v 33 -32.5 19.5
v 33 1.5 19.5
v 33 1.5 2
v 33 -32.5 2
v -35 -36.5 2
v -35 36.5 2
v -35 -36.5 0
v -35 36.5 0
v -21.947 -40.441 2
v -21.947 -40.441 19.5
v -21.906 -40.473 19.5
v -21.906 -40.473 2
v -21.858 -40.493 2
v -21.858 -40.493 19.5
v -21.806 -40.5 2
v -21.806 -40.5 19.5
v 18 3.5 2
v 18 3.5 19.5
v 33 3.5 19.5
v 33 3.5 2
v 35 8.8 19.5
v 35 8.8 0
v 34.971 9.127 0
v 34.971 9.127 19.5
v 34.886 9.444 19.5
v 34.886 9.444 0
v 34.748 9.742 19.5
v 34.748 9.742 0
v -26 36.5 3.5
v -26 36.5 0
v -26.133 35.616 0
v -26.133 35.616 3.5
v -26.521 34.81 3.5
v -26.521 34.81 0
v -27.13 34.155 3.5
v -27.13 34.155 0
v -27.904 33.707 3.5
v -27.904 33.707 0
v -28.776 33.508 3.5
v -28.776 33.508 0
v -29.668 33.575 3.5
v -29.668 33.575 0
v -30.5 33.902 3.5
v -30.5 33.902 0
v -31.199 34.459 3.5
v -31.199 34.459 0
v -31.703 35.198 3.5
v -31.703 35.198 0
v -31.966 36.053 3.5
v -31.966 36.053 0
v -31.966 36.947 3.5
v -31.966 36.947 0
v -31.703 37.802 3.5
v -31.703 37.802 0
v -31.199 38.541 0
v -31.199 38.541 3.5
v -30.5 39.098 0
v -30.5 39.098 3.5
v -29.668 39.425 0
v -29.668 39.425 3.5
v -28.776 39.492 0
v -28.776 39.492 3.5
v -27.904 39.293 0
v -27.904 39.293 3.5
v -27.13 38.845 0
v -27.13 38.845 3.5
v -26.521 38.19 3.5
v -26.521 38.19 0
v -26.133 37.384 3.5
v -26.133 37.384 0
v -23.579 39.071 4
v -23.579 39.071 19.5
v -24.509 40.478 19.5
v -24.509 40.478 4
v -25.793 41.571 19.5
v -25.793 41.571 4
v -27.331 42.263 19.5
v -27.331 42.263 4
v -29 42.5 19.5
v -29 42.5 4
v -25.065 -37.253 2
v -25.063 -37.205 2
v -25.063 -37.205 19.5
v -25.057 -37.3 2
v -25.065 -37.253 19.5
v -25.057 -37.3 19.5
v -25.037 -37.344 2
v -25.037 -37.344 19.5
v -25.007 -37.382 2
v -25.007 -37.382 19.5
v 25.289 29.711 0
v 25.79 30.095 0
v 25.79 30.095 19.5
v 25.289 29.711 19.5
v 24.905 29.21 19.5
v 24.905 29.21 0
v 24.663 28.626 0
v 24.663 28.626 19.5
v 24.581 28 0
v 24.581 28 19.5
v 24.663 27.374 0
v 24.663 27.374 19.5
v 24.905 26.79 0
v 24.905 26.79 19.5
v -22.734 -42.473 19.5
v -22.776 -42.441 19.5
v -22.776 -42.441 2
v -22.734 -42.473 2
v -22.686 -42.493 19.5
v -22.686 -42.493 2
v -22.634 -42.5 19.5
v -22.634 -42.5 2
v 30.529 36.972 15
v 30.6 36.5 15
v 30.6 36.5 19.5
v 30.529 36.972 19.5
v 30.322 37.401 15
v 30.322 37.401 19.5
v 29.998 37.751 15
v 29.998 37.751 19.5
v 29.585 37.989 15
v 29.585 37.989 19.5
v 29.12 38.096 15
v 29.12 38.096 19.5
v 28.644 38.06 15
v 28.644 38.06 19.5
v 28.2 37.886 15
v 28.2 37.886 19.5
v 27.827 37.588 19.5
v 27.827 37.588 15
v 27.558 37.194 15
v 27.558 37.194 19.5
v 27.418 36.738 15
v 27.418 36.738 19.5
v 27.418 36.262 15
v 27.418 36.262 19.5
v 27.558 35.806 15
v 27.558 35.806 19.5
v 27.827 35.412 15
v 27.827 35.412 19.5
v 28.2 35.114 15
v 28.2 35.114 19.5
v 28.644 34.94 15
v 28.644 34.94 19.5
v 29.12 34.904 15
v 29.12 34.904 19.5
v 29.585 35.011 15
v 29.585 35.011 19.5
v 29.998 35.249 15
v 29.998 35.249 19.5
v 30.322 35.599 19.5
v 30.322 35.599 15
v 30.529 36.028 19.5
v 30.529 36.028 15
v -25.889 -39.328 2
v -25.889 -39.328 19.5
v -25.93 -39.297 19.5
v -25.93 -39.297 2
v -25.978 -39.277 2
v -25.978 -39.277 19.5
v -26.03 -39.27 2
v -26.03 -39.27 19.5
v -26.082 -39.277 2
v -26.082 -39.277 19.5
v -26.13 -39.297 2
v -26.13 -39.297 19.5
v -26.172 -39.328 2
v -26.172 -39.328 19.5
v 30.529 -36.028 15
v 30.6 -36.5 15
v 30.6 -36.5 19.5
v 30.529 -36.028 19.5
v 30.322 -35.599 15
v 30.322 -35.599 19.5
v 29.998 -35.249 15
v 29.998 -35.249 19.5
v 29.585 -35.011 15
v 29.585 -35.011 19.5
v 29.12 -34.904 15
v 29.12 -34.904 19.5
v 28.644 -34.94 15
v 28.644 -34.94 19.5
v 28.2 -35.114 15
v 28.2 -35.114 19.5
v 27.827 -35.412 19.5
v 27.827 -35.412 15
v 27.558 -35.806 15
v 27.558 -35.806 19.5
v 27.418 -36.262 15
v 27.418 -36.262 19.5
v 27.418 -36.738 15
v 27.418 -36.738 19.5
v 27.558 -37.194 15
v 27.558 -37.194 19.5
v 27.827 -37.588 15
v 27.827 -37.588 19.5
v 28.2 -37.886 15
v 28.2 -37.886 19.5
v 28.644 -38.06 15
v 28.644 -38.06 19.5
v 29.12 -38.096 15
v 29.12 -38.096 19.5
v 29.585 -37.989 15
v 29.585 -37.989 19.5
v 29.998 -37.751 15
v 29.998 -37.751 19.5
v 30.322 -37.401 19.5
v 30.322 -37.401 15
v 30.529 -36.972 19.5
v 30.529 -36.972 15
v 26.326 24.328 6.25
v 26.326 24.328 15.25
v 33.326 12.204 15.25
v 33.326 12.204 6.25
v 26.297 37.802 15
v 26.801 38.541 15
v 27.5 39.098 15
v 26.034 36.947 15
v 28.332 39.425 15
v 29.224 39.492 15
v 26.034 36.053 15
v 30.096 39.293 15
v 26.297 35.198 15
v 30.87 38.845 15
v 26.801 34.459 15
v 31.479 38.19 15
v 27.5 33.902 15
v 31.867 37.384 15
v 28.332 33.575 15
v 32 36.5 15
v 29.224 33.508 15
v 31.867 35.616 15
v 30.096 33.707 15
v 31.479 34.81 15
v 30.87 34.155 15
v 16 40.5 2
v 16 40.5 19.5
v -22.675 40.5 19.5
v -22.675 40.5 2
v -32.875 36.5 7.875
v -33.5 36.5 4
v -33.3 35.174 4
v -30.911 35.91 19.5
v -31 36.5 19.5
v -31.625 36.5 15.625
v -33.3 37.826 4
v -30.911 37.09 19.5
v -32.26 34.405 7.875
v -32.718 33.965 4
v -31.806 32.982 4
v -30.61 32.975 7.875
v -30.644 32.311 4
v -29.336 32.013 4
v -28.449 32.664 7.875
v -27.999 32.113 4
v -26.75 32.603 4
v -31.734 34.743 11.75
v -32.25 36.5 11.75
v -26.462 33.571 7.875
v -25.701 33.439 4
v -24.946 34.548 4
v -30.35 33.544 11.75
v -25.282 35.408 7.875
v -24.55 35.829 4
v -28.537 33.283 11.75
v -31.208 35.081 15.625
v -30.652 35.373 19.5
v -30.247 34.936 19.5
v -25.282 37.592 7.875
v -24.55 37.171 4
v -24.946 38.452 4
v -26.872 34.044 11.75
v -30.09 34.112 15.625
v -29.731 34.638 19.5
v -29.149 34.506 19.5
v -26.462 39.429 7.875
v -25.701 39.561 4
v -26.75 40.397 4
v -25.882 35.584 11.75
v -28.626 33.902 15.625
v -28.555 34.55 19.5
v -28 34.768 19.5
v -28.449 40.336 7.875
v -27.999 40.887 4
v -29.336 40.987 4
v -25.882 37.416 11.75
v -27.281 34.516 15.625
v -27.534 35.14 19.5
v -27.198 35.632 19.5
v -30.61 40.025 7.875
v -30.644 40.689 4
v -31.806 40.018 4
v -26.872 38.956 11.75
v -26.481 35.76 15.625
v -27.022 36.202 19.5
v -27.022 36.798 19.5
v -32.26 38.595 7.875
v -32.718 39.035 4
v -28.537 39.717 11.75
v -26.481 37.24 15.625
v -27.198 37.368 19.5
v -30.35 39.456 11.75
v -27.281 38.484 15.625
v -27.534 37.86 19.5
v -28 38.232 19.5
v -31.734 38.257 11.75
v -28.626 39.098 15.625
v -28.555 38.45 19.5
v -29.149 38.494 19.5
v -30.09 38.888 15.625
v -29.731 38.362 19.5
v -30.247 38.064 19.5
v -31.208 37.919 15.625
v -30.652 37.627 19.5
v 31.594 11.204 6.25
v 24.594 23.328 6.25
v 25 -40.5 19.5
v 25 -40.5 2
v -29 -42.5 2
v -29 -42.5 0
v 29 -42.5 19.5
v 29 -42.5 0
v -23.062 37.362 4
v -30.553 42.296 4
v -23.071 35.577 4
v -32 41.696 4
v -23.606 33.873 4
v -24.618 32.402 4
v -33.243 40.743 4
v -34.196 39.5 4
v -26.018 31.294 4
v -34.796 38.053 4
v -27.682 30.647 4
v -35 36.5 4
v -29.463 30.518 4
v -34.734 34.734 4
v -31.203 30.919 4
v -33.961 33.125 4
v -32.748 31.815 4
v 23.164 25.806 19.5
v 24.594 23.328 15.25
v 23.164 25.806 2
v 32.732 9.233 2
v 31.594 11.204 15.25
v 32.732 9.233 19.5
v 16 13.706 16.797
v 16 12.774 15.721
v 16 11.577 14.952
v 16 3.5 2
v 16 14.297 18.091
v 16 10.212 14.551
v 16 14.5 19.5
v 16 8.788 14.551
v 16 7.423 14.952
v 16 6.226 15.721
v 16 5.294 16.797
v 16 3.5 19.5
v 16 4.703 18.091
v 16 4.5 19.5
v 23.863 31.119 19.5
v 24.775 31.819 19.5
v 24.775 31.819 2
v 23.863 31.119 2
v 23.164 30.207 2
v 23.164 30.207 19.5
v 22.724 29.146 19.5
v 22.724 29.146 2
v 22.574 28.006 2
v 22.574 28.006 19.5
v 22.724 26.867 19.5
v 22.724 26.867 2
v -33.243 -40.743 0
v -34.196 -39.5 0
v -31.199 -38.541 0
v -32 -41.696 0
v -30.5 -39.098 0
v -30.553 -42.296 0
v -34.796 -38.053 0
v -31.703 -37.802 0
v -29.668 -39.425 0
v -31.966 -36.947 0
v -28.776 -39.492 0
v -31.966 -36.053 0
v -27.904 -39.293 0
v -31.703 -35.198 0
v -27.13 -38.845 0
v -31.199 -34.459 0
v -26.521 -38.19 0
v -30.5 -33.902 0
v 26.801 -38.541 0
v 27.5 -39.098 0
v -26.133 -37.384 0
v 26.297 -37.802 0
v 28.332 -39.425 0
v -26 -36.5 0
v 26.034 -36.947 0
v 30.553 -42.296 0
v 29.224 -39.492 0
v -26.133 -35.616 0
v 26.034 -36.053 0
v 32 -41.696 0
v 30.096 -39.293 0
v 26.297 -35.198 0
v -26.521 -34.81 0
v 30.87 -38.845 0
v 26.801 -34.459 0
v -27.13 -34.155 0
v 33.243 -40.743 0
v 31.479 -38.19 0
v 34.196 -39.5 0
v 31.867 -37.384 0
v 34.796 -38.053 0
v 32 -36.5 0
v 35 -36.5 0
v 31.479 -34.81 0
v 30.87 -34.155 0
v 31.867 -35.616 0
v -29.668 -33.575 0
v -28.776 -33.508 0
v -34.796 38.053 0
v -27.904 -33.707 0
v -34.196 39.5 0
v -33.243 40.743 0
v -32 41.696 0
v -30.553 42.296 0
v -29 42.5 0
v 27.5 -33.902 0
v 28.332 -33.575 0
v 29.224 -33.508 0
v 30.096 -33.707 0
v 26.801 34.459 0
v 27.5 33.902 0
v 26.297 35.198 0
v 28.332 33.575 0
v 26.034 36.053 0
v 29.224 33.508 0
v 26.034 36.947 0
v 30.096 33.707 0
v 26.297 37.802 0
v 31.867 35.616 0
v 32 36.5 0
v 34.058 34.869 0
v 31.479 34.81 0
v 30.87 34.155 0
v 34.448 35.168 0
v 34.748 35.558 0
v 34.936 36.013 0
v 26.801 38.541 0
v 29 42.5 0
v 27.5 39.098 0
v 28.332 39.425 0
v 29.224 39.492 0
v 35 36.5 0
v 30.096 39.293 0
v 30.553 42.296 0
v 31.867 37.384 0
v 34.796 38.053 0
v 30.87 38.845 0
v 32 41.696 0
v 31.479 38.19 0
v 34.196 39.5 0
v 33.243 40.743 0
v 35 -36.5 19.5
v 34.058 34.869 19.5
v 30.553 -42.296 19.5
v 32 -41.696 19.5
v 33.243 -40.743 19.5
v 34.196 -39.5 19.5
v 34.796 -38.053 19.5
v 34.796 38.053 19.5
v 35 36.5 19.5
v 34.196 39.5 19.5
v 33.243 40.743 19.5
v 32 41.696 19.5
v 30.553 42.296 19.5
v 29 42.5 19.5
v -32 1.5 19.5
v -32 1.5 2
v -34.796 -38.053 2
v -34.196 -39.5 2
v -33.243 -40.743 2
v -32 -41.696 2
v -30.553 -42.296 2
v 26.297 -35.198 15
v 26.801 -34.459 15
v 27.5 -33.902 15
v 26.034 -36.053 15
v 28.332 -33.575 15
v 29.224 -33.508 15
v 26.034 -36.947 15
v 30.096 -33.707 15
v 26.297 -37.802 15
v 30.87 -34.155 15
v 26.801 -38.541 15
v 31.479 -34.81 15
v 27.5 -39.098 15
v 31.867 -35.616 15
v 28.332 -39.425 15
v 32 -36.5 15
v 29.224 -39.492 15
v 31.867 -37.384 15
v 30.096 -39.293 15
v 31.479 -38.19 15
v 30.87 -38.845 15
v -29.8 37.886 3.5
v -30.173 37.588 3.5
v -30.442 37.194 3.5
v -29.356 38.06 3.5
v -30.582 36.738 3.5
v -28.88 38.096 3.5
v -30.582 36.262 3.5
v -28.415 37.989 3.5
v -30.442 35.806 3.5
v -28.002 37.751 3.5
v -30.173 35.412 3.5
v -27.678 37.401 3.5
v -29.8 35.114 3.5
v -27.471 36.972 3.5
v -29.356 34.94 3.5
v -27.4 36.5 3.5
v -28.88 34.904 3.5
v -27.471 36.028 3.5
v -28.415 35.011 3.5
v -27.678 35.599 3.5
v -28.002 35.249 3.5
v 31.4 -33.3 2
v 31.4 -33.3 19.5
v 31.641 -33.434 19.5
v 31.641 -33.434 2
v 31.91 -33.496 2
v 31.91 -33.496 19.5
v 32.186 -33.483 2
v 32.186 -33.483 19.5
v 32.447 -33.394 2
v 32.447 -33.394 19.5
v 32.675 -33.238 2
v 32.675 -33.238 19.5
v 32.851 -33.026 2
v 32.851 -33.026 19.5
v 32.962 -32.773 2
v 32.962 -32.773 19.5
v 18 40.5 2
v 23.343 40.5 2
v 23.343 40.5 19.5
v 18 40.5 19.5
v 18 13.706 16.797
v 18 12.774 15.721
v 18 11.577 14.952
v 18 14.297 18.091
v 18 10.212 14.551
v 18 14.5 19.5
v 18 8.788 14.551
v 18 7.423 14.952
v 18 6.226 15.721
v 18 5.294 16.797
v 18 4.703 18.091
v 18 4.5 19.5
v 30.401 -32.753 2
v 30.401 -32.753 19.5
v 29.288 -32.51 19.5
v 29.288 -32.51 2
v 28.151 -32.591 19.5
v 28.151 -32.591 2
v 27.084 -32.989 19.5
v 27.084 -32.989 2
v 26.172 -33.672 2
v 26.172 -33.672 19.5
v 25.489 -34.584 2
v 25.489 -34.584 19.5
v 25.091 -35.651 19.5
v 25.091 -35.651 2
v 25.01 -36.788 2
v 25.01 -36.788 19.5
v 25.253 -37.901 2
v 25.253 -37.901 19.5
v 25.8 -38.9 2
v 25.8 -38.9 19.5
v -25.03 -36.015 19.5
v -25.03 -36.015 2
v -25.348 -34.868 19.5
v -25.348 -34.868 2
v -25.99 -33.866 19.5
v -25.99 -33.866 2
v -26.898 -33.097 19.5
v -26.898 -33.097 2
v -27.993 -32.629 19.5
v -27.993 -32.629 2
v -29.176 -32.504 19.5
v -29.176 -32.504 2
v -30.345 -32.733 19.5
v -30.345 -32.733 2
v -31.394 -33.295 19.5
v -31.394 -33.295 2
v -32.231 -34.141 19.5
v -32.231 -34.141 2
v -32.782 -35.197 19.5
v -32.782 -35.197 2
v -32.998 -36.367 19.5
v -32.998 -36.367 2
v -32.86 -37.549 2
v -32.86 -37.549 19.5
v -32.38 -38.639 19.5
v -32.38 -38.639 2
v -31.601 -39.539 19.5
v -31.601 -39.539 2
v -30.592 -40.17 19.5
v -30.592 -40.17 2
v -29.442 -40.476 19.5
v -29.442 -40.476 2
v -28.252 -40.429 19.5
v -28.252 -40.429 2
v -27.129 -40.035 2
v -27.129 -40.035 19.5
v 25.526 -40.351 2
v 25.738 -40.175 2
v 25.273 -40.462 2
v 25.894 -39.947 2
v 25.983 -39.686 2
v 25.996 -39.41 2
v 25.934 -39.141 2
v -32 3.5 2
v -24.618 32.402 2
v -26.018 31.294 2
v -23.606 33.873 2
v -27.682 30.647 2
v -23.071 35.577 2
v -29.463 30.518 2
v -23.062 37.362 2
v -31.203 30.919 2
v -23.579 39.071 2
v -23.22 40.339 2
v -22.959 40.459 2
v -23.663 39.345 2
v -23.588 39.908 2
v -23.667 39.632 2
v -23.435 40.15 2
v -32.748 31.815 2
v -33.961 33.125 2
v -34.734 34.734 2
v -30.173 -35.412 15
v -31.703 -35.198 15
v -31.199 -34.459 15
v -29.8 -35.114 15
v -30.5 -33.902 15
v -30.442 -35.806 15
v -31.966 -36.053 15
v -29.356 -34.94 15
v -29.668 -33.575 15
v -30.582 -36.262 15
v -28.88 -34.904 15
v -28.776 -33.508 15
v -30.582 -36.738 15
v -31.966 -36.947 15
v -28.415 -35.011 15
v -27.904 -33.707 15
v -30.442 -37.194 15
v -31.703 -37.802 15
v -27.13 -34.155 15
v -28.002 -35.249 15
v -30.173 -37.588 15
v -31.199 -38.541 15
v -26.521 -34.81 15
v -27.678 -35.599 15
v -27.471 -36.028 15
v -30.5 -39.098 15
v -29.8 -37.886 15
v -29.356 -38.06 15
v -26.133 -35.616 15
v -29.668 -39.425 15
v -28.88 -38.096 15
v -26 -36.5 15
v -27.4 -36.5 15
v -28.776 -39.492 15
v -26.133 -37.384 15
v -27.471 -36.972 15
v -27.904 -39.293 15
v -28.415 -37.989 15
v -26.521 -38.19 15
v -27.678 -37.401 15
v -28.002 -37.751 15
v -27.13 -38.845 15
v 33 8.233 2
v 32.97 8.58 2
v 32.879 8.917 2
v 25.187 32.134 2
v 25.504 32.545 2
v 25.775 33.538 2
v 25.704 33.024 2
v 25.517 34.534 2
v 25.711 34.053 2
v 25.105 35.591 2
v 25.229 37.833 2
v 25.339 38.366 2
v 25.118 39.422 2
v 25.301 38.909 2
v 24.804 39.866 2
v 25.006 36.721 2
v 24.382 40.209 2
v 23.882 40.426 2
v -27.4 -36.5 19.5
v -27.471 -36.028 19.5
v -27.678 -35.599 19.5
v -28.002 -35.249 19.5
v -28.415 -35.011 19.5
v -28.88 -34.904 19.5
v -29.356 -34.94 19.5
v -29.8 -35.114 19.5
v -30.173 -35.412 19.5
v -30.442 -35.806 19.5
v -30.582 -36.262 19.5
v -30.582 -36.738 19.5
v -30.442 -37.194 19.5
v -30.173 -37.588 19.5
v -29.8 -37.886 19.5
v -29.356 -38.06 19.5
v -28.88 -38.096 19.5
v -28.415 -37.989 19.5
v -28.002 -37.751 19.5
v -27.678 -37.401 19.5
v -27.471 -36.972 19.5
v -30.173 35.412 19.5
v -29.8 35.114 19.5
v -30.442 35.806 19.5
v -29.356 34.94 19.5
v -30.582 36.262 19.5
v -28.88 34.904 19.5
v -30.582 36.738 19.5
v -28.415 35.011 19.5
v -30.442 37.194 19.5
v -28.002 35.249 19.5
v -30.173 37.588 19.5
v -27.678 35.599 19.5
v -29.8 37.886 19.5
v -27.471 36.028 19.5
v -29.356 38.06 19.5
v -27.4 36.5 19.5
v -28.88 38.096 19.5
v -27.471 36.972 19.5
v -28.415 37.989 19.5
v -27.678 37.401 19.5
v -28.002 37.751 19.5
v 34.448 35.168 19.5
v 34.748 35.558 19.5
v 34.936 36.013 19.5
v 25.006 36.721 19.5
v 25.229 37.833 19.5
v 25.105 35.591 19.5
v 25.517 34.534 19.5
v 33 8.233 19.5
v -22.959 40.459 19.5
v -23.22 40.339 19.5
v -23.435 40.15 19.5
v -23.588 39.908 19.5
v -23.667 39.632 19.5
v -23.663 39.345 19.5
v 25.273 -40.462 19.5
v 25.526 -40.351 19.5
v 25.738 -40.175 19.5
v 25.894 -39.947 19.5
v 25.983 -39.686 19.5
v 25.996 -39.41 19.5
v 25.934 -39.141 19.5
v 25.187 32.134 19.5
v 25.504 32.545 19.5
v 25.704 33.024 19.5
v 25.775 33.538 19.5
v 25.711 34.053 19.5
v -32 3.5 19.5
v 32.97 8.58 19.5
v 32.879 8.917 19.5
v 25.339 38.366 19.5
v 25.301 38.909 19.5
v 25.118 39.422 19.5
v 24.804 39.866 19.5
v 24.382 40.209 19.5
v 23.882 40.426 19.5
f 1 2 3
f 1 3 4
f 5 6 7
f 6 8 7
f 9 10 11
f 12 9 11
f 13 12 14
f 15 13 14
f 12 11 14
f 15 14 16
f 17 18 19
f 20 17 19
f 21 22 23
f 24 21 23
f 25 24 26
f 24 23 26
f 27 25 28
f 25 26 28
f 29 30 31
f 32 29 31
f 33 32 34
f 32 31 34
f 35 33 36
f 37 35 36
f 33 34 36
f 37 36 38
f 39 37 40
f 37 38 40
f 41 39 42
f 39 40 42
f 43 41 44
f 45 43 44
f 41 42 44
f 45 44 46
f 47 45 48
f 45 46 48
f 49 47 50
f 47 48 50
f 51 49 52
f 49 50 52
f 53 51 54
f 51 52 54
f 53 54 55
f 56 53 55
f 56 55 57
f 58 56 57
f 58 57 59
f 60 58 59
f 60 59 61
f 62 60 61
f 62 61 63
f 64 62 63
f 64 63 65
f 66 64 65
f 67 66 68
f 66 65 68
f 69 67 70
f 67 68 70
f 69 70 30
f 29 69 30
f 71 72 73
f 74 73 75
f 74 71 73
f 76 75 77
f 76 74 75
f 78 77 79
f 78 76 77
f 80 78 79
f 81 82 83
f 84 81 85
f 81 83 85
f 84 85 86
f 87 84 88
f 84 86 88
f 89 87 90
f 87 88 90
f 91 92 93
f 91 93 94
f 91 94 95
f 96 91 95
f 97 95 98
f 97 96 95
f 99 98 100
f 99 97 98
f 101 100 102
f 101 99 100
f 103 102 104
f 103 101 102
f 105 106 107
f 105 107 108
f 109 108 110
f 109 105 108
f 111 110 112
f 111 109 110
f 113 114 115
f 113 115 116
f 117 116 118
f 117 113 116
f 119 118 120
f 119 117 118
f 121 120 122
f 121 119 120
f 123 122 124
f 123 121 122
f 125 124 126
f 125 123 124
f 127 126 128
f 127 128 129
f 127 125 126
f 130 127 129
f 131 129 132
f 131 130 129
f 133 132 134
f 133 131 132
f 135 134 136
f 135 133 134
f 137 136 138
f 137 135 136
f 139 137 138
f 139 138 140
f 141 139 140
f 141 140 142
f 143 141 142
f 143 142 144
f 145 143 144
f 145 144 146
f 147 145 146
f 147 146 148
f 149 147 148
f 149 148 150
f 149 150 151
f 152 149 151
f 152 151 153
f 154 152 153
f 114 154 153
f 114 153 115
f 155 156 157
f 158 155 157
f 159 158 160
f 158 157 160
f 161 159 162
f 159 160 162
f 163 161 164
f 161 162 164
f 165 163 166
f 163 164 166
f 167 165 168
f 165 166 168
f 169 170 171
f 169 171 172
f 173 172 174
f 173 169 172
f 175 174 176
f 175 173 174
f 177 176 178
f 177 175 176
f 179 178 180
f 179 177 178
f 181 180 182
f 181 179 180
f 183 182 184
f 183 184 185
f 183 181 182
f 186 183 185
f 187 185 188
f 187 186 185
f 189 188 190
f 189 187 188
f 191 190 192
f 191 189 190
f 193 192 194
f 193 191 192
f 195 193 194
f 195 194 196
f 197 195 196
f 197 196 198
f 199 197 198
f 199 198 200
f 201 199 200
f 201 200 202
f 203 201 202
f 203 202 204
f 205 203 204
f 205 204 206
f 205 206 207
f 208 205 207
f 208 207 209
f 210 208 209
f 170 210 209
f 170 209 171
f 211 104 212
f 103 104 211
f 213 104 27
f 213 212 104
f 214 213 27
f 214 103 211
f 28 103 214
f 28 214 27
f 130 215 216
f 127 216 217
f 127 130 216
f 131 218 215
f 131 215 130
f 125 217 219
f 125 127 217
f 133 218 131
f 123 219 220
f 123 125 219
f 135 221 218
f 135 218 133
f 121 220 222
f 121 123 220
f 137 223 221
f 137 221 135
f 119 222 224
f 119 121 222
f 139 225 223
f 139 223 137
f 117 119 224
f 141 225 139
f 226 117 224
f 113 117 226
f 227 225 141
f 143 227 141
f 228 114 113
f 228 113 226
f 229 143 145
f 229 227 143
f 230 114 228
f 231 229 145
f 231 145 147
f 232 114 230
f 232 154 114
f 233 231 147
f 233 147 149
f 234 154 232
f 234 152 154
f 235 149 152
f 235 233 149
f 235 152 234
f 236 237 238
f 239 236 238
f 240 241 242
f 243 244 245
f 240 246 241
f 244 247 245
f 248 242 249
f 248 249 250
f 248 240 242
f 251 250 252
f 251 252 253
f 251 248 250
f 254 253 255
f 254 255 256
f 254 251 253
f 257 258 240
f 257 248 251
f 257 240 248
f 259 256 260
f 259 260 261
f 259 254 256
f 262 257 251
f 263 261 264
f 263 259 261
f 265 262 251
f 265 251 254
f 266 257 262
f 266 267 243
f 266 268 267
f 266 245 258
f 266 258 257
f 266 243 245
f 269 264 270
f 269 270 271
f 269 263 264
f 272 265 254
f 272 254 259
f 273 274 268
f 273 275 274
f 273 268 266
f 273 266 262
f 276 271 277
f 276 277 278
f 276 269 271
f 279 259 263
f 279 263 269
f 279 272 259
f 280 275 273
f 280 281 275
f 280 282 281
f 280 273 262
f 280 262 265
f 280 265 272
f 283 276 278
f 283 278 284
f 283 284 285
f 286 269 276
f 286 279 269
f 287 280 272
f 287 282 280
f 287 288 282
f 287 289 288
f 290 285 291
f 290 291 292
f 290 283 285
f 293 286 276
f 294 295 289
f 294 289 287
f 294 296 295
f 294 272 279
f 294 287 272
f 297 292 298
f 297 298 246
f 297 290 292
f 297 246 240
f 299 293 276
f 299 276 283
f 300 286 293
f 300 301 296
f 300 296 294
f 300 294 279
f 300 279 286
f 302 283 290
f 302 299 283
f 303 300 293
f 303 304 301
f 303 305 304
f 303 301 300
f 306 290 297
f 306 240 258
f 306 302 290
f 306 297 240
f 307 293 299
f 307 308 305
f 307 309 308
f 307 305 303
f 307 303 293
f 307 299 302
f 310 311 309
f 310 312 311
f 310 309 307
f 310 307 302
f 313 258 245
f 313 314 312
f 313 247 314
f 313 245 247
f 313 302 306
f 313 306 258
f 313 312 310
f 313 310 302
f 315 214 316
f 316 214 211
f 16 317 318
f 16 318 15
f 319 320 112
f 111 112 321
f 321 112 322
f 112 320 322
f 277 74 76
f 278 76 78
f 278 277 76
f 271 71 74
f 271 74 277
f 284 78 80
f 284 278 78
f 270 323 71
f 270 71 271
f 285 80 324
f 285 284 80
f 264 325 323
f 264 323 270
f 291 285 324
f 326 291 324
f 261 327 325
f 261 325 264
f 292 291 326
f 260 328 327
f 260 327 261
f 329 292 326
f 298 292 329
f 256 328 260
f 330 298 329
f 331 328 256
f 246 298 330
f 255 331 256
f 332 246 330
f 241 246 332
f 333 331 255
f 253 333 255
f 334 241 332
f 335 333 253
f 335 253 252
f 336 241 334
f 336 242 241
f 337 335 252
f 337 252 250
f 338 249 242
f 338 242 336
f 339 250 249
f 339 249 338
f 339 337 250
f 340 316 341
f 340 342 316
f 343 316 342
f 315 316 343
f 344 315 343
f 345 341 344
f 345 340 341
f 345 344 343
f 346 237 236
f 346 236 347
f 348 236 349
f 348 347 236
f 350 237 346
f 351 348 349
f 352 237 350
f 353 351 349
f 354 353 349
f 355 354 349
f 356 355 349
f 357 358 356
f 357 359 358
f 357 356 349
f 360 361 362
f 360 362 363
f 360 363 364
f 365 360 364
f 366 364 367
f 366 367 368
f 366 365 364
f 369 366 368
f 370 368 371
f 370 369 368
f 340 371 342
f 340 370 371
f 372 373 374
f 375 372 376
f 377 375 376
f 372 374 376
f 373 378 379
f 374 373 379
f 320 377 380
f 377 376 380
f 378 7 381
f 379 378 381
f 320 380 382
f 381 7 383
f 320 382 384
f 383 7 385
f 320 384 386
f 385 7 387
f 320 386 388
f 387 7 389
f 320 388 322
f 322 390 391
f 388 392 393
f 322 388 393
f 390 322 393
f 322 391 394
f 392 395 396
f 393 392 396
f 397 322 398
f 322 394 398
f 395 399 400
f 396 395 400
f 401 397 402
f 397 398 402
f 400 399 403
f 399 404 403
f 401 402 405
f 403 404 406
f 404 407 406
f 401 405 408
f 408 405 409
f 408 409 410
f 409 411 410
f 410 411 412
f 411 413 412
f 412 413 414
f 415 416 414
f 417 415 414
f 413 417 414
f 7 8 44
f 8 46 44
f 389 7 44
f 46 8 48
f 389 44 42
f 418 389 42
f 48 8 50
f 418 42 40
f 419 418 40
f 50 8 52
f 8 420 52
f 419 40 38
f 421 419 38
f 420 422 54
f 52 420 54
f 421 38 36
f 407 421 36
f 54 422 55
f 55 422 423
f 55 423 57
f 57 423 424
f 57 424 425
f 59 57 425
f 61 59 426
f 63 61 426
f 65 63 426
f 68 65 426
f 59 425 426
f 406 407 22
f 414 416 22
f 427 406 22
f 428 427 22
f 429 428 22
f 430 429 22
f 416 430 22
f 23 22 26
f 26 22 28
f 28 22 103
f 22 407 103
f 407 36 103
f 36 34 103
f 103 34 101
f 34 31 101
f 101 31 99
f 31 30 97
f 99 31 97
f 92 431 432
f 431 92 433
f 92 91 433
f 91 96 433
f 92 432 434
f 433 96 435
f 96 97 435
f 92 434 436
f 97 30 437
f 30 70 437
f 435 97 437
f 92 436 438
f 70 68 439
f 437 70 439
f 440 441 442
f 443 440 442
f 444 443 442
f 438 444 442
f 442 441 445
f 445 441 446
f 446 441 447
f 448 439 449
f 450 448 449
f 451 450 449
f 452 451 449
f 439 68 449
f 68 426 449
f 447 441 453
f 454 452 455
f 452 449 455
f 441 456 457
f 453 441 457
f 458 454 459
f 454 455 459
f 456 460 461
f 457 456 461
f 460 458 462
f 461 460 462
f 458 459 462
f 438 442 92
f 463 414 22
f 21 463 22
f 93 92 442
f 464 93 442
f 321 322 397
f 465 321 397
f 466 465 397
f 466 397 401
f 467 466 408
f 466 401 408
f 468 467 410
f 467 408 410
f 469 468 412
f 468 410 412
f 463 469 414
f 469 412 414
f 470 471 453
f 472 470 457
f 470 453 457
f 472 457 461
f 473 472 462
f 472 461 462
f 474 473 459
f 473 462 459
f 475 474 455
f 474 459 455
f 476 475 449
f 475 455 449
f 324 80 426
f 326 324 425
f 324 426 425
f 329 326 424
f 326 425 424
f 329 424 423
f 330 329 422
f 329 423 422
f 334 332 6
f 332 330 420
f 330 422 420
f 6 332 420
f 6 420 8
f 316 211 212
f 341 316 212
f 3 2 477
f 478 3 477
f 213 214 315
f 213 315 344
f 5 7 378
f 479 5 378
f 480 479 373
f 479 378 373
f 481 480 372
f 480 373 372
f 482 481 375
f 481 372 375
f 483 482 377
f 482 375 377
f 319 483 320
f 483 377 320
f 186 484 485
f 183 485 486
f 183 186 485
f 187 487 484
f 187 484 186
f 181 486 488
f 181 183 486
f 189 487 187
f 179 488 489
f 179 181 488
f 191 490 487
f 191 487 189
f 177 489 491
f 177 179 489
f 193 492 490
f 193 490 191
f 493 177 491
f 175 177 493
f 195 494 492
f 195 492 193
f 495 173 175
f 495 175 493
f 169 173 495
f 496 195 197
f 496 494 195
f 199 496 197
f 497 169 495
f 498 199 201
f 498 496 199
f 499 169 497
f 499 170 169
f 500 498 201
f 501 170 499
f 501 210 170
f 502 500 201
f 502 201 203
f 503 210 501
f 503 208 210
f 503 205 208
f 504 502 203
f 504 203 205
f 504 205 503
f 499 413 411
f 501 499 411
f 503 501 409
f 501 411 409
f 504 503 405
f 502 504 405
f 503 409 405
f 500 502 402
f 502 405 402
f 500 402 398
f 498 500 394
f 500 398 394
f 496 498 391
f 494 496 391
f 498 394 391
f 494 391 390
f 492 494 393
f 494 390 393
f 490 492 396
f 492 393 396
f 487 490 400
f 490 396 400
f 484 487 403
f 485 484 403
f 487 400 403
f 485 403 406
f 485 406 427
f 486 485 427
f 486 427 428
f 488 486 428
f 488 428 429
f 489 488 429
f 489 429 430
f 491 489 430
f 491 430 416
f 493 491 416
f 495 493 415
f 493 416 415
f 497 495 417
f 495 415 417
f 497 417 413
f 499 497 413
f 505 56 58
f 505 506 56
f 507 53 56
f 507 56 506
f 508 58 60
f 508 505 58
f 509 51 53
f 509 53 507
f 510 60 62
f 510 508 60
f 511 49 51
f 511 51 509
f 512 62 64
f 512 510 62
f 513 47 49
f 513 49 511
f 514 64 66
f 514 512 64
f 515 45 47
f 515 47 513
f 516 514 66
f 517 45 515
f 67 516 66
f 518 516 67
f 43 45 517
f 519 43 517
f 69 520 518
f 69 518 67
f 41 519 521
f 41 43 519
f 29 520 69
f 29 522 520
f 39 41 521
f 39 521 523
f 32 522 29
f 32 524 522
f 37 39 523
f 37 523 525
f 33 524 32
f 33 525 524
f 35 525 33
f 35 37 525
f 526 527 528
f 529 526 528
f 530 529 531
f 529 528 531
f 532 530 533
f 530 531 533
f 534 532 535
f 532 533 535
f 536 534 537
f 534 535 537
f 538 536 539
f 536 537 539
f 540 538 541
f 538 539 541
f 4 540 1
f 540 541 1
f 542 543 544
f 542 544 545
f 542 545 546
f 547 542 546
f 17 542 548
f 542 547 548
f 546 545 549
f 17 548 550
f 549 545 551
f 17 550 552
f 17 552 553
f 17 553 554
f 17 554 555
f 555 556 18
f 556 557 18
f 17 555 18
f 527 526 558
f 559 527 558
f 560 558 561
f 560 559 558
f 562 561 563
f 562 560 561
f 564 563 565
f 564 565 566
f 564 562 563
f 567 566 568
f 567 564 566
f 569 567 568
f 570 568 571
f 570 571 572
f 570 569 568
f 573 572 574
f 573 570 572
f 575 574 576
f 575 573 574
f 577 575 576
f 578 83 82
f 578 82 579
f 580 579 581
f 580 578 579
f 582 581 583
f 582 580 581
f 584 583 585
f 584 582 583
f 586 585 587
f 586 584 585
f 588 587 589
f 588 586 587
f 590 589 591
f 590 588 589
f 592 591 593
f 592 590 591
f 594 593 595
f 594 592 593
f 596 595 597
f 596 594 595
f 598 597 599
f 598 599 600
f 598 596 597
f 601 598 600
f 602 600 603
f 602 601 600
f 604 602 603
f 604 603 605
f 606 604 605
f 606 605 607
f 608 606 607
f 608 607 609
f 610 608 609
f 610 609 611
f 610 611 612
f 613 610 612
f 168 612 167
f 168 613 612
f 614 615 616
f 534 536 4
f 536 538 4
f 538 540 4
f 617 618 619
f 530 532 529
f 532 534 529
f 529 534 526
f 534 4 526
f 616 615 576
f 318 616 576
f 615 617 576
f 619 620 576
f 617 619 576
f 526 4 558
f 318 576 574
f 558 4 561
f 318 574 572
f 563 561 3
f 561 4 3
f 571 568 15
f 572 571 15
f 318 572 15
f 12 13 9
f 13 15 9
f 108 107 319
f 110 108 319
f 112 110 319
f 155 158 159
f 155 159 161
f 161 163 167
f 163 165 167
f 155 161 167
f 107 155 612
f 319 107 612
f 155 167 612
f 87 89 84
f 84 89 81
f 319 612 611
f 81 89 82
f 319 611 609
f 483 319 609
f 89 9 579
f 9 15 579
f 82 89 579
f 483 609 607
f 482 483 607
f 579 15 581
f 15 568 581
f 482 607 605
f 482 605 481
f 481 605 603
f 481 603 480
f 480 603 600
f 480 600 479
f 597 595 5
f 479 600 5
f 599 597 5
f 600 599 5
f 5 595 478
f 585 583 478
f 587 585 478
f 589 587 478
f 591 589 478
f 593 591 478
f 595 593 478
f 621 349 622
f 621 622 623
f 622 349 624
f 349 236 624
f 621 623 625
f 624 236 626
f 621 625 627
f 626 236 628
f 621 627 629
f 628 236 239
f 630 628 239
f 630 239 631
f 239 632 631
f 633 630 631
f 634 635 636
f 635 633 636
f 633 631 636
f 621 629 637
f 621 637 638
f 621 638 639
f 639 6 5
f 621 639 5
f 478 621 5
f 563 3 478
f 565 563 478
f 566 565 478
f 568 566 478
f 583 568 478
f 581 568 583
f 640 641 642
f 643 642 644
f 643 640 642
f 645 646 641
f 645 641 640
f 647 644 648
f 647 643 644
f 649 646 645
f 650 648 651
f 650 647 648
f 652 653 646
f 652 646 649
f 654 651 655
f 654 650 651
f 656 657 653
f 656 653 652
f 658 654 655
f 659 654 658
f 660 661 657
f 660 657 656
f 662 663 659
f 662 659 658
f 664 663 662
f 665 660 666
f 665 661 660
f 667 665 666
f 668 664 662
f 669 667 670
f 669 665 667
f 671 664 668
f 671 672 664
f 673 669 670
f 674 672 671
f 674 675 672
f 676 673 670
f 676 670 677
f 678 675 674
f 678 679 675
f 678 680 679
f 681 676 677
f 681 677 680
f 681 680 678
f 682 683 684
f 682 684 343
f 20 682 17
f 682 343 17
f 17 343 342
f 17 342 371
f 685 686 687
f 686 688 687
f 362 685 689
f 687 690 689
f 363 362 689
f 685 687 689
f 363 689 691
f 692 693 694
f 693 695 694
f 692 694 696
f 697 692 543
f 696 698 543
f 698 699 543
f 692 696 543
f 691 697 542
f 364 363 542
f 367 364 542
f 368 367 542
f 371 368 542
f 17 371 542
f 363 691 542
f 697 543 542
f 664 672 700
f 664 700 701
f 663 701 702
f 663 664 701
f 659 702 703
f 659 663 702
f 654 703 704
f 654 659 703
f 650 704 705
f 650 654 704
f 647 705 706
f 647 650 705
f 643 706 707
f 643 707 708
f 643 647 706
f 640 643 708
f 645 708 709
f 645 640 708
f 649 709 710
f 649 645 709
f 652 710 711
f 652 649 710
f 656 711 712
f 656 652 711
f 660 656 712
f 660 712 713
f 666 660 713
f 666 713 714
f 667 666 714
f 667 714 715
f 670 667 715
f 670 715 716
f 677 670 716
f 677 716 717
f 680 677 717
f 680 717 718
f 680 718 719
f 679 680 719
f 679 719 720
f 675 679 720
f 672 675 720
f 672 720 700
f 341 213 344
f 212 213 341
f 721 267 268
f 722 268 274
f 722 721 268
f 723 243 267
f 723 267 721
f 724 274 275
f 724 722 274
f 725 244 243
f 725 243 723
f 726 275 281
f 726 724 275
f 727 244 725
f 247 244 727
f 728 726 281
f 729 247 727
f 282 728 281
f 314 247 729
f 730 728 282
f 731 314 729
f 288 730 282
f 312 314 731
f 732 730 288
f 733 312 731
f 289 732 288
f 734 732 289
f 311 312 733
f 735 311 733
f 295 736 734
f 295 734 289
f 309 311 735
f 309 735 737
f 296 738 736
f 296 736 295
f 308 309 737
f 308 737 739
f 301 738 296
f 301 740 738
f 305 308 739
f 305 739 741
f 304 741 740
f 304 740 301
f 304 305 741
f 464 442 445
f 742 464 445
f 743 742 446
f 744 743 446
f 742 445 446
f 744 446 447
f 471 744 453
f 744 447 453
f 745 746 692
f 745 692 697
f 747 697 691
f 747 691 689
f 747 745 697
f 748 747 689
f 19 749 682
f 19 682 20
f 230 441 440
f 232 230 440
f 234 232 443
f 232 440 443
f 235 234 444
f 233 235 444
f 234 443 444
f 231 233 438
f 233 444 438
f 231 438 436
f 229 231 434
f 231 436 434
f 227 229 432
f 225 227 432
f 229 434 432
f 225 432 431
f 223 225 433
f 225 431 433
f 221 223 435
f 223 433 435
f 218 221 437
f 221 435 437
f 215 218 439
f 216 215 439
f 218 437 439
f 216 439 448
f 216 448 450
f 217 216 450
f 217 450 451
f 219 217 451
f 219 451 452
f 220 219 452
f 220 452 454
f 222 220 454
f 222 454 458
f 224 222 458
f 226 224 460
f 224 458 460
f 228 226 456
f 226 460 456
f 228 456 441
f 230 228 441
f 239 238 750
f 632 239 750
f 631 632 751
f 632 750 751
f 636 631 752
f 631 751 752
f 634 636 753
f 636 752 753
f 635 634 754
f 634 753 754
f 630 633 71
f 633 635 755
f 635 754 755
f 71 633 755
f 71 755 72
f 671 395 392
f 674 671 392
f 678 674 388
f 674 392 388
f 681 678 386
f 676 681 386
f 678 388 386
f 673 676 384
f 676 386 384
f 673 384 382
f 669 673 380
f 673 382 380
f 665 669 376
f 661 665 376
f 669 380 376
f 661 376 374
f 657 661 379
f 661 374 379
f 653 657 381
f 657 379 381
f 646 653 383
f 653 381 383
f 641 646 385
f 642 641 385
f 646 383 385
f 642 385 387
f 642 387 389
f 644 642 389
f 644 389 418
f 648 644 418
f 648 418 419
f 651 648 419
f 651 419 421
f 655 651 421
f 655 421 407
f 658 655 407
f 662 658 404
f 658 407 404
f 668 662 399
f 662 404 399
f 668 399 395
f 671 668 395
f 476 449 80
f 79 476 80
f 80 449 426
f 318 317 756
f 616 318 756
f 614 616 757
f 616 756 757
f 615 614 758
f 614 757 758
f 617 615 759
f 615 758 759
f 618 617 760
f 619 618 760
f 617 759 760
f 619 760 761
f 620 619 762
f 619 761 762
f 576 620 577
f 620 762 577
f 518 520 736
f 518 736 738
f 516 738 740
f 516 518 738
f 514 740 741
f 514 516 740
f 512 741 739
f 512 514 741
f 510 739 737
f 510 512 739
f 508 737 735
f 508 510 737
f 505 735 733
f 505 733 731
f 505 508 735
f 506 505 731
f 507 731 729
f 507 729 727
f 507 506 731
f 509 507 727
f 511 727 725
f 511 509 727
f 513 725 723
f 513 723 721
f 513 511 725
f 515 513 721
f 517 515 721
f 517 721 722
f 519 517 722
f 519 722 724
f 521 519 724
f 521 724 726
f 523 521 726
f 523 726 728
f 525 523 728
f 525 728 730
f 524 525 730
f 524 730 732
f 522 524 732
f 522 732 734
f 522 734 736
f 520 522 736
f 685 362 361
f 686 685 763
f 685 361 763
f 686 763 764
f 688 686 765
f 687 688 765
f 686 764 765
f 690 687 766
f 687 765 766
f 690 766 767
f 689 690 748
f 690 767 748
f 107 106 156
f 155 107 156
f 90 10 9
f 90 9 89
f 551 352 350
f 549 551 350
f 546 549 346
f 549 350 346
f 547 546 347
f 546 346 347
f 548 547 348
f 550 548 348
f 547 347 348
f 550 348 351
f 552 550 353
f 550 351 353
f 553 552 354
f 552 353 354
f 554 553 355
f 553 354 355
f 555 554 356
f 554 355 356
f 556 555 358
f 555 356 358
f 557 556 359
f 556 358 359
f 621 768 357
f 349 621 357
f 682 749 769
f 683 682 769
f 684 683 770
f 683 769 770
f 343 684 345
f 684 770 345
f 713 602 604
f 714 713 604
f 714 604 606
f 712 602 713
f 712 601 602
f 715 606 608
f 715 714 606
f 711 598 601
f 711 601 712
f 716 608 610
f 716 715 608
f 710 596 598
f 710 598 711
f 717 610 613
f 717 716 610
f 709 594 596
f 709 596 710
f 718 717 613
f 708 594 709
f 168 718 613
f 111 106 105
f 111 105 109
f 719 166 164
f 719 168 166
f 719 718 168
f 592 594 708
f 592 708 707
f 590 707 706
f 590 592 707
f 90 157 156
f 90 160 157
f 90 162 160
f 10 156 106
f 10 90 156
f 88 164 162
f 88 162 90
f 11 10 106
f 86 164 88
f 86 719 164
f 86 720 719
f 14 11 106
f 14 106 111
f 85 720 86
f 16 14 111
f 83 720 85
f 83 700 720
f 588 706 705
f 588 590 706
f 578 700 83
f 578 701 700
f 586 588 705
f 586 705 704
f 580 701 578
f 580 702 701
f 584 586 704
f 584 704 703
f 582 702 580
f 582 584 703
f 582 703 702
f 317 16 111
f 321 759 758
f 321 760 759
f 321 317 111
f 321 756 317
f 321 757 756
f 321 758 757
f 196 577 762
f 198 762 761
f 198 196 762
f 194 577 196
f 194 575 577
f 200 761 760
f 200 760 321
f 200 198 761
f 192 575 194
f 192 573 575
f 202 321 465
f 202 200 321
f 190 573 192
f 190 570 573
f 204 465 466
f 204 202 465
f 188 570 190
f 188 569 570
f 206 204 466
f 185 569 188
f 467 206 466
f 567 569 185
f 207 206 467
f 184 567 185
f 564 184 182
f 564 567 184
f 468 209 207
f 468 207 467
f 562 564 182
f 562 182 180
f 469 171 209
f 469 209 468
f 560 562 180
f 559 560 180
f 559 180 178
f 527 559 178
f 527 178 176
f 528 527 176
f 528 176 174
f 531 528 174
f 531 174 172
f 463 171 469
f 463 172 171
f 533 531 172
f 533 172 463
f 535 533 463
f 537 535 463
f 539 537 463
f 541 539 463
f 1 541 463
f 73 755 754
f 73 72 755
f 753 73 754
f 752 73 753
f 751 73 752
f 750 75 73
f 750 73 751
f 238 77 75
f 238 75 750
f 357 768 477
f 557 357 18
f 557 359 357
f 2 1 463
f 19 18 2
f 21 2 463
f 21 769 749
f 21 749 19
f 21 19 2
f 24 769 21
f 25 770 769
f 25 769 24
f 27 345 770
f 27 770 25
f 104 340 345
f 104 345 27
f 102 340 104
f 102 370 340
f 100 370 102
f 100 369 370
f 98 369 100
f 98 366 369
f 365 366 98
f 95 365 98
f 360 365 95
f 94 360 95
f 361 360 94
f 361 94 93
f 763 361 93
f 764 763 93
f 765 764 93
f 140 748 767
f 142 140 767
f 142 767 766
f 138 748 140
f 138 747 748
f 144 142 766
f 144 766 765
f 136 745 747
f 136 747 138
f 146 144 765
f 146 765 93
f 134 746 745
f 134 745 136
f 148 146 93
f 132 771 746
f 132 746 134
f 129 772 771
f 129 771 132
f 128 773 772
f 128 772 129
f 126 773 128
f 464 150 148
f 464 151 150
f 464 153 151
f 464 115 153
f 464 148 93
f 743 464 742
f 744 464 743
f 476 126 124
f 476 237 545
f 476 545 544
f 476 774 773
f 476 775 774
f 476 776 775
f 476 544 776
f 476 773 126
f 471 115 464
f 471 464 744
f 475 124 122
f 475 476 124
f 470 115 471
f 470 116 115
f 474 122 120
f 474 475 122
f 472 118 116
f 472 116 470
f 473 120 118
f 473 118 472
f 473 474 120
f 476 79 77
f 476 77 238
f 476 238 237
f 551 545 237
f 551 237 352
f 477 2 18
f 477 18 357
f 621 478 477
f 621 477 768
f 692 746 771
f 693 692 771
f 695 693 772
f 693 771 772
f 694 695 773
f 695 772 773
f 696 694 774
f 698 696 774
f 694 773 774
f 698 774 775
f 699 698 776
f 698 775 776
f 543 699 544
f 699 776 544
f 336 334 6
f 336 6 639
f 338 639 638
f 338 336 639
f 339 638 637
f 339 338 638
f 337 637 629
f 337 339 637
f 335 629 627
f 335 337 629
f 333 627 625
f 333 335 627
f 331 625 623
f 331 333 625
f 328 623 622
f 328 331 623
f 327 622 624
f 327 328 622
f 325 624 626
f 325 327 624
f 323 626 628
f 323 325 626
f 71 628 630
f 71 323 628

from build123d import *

# Parameters (mm, degrees)
SKETCH002_R     = 1.6
PAD001_DEPTH    = 19.5
POCKET001_DEPTH = 17.5
SKETCH005_R     = 3
POCKET002_DEPTH = 15
SKETCH006_R     = 3
POCKET003_DEPTH = 3.5
POCKET004_DEPTH = 2
SKETCH008_W     = 14
SKETCH008_H     = 9
POCKET005_DEPTH = 2


with BuildPart() as part:
    # Sketch002 → Pad001 (new body)
    with BuildSketch(Plane.XY):
        with BuildLine():
            Line((-35, 36.5000000001), (-35, -36.5))
            ThreePointArc((-35, -36.5), (-33.2426406871, -40.7426406871), (-29, -42.5))
            Line((-29, -42.5), (29, -42.5))
            ThreePointArc((29, -42.5), (33.2426406868, -40.7426406875), (35, -36.500000001))
            Line((35, -36.500000001), (35.0000000077, 8.799999999))
            ThreePointArc((35.0000000077, 8.799999999), (34.9358203402, 9.2874929726), (34.747655076, 9.7417641056))
            Line((24.9046932533, 26.7902740862), (34.747655076, 9.7417641056))
            ThreePointArc((25.7902740862, 30.0953067467), (24.6629889937, 28.6262002123), (24.9046932533, 26.7902740862))
            Line((25.7902740862, 30.0953067467), (34.0582358931, 34.8688167197))
            ThreePointArc((34.0582358931, 34.8688167197), (34.7476550681, 35.5582358947), (34.9999999999, 36.5000000017))
            ThreePointArc((34.9999999999, 36.5000000017), (33.2426406864, 40.7426406877), (28.9999999999, 42.5))
            Line((28.9999999999, 42.5), (-29.0000000001, 42.5))
            ThreePointArc((-29.0000000001, 42.5), (-33.2426406871, 40.7426406871), (-35, 36.5000000001))
        make_face()
        with Locations((28.9999999999, 36.5)):
            Circle(SKETCH002_R, mode=Mode.SUBTRACT)
        with Locations((29, -36.5)):
            Circle(SKETCH002_R, mode=Mode.SUBTRACT)
        with Locations((-29, -36.5)):
            Circle(SKETCH002_R, mode=Mode.SUBTRACT)
        with Locations((-29.0000000001, 36.5000000001)):
            Circle(SKETCH002_R, mode=Mode.SUBTRACT)
    extrude(amount=PAD001_DEPTH)

    # Sketch003 (on Face19 of Pad001) → Pocket001 (cut)
    with BuildSketch(Plane.XY.offset(19.5)):
        with BuildLine():
            ThreePointArc((25.2287638336, 37.8333333333), (25.0151381406, 36.1523277954), (25.516649593, 34.5337167186))
            ThreePointArc((24.7749743893, 31.8185242701), (25.7042911697, 33.0235677135), (25.516649593, 34.5337167186))
            ThreePointArc((24.7749743893, 31.8185242701), (22.7240689546, 29.1457322713), (23.1638091612, 25.8055737838))
            Line((23.1638091612, 25.8055737838), (32.7320508154, 9.2328930931))
            ThreePointArc((33.0000000077, 8.2328930934), (32.9318516603, 8.7505311835), (32.7320508154, 9.2328930931))
            Line((33.0000000077, 8.2328930934), (33.0000000077, 3.5))
            Line((18.0000000077, 3.5), (33.0000000077, 3.5))
            Line((18.0000000077, 40.5), (18.0000000077, 3.5))
            Line((23.3431457504, 40.5), (18.0000000077, 40.5))
            ThreePointArc((25.2287638336, 37.8333333333), (24.9761389123, 39.6547005384), (23.3431457504, 40.5))
        make_face()
        with BuildLine():
            ThreePointArc((31.4000000061, -33.3000000046), (26.171572878, -33.6715728725), (25.8, -38.9))
            ThreePointArc((25, -40.5), (25.894427191, -39.9472135955), (25.8, -38.9))
            Line((25, -40.5), (-21.8058862217, -40.5))
            ThreePointArc((-21.947307578, -40.4414213562), (-21.8824229082, -40.4847759065), (-21.8058862217, -40.5))
            Line((-21.947307578, -40.4414213562), (-25.0071533734, -37.3815755608))
            ThreePointArc((-25.0626019212, -37.2049087662), (-25.0565540108, -37.3000454956), (-25.0071533734, -37.3815755608))
            ThreePointArc((-25.0626019212, -37.2049087662), (-32.5456214666, -34.648360614), (-26.1715722902, -39.3284265397))
            ThreePointArc((-25.8887295485, -39.3284265105), (-26.0301509254, -39.2698478667), (-26.1715722902, -39.3284265397))
            Line((-22.7757347027, -42.4414213562), (-25.8887295485, -39.3284265105))
            ThreePointArc((-22.7757347027, -42.4414213562), (-22.710850033, -42.4847759065), (-22.6343133465, -42.5))
            Line((-29, -42.5), (-22.6343133465, -42.5))
            ThreePointArc((-35, -36.5), (-33.2426406871, -40.7426406871), (-29, -42.5))
            Line((-35, -36.5), (-35, 36.4999997364))
            ThreePointArc((-35, 36.4999997364), (-27.6821008816, 30.6465273631), (-23.5789525827, 39.0714285714))
            ThreePointArc((-22.6754446798, 40.5), (-23.5205989345, 40.0345224838), (-23.5789525827, 39.0714285714))
            Line((16.0000000077, 40.5), (-22.6754446798, 40.5))
            Line((16.0000000077, 40.5), (16.0000000077, 3.5))
            Line((-32, 3.5), (16.0000000077, 3.5))
            Line((-32, 1.5), (-32, 3.5))
            Line((33.0000000077, 1.5), (-32, 1.5))
            Line((33.0000000077, 1.5), (33.0000000077, -32.5000000058))
            ThreePointArc((31.4000000061, -33.3000000046), (32.4472136023, -33.3944271972), (33.0000000077, -32.5000000058))
        make_face()
    extrude(amount=-POCKET001_DEPTH, mode=Mode.SUBTRACT)

    # Sketch004 (on DatumLine) → Groove (revolve, cut)
    with BuildSketch(Plane(origin=(-29.0000000001, 36.5000000001, 19.5), x_dir=(1, 0, 0), z_dir=(0, -1, 0))):
        Polygon((-5.9999999999, 0), (-5.9999999999, -15.5), (-4.4999999999, -15.5), (-2, 0), align=None)
    revolve(axis=Axis((-29.0000000001, 36.5000000001, 19.5), (0, 0, 1)), mode=Mode.SUBTRACT)

    # Sketch005 (on Face4 of Groove) → Pocket002 (cut)
    with BuildSketch(Plane(origin=(0, 0, 0), x_dir=(1, 0, 0), z_dir=(0, 0, -1))):
        with Locations((29, -36.5)):
            Circle(SKETCH005_R)
        with Locations((29, 36.5)):
            Circle(SKETCH005_R)
        with Locations((-29, 36.5)):
            Circle(SKETCH005_R)
    extrude(amount=-POCKET002_DEPTH, mode=Mode.SUBTRACT)

    # Sketch006 (on Face4 of Pocket002) → Pocket003 (cut)
    with BuildSketch(Plane(origin=(0, 0, 0), x_dir=(1, 0, 0), z_dir=(0, 0, -1))):
        with Locations((-29, -36.5)):
            Circle(SKETCH006_R)
    extrude(amount=-POCKET003_DEPTH, mode=Mode.SUBTRACT)

    # Sketch007 (on Face35 of Pocket003) → Pocket004 (cut)
    with BuildSketch(Plane(origin=(16.0000000077, 0, 0), x_dir=(0, -1, 0), z_dir=(-1, 0, 0))):
        with BuildLine():
            ThreePointArc((-14.5, 19.5), (-9.5, 14.5), (-4.5, 19.5))
            Line((-14.5, 19.5), (-4.5, 19.5))
        make_face()
    extrude(amount=-POCKET004_DEPTH, mode=Mode.SUBTRACT)

    # Sketch008 (on Face6 of Pocket004) → Pocket005 (cut)
    with BuildSketch(Plane(origin=(30.2790489079, 17.4816170309, 0), x_dir=(-0.4999999999, 0.8660254039, 0), z_dir=(0.8660254039, 0.4999999999, 0))):
        with Locations((0.9057494867, 10.75)):
            Rectangle(SKETCH008_W, SKETCH008_H)
    extrude(amount=-POCKET005_DEPTH, mode=Mode.SUBTRACT)


solid = part.part
